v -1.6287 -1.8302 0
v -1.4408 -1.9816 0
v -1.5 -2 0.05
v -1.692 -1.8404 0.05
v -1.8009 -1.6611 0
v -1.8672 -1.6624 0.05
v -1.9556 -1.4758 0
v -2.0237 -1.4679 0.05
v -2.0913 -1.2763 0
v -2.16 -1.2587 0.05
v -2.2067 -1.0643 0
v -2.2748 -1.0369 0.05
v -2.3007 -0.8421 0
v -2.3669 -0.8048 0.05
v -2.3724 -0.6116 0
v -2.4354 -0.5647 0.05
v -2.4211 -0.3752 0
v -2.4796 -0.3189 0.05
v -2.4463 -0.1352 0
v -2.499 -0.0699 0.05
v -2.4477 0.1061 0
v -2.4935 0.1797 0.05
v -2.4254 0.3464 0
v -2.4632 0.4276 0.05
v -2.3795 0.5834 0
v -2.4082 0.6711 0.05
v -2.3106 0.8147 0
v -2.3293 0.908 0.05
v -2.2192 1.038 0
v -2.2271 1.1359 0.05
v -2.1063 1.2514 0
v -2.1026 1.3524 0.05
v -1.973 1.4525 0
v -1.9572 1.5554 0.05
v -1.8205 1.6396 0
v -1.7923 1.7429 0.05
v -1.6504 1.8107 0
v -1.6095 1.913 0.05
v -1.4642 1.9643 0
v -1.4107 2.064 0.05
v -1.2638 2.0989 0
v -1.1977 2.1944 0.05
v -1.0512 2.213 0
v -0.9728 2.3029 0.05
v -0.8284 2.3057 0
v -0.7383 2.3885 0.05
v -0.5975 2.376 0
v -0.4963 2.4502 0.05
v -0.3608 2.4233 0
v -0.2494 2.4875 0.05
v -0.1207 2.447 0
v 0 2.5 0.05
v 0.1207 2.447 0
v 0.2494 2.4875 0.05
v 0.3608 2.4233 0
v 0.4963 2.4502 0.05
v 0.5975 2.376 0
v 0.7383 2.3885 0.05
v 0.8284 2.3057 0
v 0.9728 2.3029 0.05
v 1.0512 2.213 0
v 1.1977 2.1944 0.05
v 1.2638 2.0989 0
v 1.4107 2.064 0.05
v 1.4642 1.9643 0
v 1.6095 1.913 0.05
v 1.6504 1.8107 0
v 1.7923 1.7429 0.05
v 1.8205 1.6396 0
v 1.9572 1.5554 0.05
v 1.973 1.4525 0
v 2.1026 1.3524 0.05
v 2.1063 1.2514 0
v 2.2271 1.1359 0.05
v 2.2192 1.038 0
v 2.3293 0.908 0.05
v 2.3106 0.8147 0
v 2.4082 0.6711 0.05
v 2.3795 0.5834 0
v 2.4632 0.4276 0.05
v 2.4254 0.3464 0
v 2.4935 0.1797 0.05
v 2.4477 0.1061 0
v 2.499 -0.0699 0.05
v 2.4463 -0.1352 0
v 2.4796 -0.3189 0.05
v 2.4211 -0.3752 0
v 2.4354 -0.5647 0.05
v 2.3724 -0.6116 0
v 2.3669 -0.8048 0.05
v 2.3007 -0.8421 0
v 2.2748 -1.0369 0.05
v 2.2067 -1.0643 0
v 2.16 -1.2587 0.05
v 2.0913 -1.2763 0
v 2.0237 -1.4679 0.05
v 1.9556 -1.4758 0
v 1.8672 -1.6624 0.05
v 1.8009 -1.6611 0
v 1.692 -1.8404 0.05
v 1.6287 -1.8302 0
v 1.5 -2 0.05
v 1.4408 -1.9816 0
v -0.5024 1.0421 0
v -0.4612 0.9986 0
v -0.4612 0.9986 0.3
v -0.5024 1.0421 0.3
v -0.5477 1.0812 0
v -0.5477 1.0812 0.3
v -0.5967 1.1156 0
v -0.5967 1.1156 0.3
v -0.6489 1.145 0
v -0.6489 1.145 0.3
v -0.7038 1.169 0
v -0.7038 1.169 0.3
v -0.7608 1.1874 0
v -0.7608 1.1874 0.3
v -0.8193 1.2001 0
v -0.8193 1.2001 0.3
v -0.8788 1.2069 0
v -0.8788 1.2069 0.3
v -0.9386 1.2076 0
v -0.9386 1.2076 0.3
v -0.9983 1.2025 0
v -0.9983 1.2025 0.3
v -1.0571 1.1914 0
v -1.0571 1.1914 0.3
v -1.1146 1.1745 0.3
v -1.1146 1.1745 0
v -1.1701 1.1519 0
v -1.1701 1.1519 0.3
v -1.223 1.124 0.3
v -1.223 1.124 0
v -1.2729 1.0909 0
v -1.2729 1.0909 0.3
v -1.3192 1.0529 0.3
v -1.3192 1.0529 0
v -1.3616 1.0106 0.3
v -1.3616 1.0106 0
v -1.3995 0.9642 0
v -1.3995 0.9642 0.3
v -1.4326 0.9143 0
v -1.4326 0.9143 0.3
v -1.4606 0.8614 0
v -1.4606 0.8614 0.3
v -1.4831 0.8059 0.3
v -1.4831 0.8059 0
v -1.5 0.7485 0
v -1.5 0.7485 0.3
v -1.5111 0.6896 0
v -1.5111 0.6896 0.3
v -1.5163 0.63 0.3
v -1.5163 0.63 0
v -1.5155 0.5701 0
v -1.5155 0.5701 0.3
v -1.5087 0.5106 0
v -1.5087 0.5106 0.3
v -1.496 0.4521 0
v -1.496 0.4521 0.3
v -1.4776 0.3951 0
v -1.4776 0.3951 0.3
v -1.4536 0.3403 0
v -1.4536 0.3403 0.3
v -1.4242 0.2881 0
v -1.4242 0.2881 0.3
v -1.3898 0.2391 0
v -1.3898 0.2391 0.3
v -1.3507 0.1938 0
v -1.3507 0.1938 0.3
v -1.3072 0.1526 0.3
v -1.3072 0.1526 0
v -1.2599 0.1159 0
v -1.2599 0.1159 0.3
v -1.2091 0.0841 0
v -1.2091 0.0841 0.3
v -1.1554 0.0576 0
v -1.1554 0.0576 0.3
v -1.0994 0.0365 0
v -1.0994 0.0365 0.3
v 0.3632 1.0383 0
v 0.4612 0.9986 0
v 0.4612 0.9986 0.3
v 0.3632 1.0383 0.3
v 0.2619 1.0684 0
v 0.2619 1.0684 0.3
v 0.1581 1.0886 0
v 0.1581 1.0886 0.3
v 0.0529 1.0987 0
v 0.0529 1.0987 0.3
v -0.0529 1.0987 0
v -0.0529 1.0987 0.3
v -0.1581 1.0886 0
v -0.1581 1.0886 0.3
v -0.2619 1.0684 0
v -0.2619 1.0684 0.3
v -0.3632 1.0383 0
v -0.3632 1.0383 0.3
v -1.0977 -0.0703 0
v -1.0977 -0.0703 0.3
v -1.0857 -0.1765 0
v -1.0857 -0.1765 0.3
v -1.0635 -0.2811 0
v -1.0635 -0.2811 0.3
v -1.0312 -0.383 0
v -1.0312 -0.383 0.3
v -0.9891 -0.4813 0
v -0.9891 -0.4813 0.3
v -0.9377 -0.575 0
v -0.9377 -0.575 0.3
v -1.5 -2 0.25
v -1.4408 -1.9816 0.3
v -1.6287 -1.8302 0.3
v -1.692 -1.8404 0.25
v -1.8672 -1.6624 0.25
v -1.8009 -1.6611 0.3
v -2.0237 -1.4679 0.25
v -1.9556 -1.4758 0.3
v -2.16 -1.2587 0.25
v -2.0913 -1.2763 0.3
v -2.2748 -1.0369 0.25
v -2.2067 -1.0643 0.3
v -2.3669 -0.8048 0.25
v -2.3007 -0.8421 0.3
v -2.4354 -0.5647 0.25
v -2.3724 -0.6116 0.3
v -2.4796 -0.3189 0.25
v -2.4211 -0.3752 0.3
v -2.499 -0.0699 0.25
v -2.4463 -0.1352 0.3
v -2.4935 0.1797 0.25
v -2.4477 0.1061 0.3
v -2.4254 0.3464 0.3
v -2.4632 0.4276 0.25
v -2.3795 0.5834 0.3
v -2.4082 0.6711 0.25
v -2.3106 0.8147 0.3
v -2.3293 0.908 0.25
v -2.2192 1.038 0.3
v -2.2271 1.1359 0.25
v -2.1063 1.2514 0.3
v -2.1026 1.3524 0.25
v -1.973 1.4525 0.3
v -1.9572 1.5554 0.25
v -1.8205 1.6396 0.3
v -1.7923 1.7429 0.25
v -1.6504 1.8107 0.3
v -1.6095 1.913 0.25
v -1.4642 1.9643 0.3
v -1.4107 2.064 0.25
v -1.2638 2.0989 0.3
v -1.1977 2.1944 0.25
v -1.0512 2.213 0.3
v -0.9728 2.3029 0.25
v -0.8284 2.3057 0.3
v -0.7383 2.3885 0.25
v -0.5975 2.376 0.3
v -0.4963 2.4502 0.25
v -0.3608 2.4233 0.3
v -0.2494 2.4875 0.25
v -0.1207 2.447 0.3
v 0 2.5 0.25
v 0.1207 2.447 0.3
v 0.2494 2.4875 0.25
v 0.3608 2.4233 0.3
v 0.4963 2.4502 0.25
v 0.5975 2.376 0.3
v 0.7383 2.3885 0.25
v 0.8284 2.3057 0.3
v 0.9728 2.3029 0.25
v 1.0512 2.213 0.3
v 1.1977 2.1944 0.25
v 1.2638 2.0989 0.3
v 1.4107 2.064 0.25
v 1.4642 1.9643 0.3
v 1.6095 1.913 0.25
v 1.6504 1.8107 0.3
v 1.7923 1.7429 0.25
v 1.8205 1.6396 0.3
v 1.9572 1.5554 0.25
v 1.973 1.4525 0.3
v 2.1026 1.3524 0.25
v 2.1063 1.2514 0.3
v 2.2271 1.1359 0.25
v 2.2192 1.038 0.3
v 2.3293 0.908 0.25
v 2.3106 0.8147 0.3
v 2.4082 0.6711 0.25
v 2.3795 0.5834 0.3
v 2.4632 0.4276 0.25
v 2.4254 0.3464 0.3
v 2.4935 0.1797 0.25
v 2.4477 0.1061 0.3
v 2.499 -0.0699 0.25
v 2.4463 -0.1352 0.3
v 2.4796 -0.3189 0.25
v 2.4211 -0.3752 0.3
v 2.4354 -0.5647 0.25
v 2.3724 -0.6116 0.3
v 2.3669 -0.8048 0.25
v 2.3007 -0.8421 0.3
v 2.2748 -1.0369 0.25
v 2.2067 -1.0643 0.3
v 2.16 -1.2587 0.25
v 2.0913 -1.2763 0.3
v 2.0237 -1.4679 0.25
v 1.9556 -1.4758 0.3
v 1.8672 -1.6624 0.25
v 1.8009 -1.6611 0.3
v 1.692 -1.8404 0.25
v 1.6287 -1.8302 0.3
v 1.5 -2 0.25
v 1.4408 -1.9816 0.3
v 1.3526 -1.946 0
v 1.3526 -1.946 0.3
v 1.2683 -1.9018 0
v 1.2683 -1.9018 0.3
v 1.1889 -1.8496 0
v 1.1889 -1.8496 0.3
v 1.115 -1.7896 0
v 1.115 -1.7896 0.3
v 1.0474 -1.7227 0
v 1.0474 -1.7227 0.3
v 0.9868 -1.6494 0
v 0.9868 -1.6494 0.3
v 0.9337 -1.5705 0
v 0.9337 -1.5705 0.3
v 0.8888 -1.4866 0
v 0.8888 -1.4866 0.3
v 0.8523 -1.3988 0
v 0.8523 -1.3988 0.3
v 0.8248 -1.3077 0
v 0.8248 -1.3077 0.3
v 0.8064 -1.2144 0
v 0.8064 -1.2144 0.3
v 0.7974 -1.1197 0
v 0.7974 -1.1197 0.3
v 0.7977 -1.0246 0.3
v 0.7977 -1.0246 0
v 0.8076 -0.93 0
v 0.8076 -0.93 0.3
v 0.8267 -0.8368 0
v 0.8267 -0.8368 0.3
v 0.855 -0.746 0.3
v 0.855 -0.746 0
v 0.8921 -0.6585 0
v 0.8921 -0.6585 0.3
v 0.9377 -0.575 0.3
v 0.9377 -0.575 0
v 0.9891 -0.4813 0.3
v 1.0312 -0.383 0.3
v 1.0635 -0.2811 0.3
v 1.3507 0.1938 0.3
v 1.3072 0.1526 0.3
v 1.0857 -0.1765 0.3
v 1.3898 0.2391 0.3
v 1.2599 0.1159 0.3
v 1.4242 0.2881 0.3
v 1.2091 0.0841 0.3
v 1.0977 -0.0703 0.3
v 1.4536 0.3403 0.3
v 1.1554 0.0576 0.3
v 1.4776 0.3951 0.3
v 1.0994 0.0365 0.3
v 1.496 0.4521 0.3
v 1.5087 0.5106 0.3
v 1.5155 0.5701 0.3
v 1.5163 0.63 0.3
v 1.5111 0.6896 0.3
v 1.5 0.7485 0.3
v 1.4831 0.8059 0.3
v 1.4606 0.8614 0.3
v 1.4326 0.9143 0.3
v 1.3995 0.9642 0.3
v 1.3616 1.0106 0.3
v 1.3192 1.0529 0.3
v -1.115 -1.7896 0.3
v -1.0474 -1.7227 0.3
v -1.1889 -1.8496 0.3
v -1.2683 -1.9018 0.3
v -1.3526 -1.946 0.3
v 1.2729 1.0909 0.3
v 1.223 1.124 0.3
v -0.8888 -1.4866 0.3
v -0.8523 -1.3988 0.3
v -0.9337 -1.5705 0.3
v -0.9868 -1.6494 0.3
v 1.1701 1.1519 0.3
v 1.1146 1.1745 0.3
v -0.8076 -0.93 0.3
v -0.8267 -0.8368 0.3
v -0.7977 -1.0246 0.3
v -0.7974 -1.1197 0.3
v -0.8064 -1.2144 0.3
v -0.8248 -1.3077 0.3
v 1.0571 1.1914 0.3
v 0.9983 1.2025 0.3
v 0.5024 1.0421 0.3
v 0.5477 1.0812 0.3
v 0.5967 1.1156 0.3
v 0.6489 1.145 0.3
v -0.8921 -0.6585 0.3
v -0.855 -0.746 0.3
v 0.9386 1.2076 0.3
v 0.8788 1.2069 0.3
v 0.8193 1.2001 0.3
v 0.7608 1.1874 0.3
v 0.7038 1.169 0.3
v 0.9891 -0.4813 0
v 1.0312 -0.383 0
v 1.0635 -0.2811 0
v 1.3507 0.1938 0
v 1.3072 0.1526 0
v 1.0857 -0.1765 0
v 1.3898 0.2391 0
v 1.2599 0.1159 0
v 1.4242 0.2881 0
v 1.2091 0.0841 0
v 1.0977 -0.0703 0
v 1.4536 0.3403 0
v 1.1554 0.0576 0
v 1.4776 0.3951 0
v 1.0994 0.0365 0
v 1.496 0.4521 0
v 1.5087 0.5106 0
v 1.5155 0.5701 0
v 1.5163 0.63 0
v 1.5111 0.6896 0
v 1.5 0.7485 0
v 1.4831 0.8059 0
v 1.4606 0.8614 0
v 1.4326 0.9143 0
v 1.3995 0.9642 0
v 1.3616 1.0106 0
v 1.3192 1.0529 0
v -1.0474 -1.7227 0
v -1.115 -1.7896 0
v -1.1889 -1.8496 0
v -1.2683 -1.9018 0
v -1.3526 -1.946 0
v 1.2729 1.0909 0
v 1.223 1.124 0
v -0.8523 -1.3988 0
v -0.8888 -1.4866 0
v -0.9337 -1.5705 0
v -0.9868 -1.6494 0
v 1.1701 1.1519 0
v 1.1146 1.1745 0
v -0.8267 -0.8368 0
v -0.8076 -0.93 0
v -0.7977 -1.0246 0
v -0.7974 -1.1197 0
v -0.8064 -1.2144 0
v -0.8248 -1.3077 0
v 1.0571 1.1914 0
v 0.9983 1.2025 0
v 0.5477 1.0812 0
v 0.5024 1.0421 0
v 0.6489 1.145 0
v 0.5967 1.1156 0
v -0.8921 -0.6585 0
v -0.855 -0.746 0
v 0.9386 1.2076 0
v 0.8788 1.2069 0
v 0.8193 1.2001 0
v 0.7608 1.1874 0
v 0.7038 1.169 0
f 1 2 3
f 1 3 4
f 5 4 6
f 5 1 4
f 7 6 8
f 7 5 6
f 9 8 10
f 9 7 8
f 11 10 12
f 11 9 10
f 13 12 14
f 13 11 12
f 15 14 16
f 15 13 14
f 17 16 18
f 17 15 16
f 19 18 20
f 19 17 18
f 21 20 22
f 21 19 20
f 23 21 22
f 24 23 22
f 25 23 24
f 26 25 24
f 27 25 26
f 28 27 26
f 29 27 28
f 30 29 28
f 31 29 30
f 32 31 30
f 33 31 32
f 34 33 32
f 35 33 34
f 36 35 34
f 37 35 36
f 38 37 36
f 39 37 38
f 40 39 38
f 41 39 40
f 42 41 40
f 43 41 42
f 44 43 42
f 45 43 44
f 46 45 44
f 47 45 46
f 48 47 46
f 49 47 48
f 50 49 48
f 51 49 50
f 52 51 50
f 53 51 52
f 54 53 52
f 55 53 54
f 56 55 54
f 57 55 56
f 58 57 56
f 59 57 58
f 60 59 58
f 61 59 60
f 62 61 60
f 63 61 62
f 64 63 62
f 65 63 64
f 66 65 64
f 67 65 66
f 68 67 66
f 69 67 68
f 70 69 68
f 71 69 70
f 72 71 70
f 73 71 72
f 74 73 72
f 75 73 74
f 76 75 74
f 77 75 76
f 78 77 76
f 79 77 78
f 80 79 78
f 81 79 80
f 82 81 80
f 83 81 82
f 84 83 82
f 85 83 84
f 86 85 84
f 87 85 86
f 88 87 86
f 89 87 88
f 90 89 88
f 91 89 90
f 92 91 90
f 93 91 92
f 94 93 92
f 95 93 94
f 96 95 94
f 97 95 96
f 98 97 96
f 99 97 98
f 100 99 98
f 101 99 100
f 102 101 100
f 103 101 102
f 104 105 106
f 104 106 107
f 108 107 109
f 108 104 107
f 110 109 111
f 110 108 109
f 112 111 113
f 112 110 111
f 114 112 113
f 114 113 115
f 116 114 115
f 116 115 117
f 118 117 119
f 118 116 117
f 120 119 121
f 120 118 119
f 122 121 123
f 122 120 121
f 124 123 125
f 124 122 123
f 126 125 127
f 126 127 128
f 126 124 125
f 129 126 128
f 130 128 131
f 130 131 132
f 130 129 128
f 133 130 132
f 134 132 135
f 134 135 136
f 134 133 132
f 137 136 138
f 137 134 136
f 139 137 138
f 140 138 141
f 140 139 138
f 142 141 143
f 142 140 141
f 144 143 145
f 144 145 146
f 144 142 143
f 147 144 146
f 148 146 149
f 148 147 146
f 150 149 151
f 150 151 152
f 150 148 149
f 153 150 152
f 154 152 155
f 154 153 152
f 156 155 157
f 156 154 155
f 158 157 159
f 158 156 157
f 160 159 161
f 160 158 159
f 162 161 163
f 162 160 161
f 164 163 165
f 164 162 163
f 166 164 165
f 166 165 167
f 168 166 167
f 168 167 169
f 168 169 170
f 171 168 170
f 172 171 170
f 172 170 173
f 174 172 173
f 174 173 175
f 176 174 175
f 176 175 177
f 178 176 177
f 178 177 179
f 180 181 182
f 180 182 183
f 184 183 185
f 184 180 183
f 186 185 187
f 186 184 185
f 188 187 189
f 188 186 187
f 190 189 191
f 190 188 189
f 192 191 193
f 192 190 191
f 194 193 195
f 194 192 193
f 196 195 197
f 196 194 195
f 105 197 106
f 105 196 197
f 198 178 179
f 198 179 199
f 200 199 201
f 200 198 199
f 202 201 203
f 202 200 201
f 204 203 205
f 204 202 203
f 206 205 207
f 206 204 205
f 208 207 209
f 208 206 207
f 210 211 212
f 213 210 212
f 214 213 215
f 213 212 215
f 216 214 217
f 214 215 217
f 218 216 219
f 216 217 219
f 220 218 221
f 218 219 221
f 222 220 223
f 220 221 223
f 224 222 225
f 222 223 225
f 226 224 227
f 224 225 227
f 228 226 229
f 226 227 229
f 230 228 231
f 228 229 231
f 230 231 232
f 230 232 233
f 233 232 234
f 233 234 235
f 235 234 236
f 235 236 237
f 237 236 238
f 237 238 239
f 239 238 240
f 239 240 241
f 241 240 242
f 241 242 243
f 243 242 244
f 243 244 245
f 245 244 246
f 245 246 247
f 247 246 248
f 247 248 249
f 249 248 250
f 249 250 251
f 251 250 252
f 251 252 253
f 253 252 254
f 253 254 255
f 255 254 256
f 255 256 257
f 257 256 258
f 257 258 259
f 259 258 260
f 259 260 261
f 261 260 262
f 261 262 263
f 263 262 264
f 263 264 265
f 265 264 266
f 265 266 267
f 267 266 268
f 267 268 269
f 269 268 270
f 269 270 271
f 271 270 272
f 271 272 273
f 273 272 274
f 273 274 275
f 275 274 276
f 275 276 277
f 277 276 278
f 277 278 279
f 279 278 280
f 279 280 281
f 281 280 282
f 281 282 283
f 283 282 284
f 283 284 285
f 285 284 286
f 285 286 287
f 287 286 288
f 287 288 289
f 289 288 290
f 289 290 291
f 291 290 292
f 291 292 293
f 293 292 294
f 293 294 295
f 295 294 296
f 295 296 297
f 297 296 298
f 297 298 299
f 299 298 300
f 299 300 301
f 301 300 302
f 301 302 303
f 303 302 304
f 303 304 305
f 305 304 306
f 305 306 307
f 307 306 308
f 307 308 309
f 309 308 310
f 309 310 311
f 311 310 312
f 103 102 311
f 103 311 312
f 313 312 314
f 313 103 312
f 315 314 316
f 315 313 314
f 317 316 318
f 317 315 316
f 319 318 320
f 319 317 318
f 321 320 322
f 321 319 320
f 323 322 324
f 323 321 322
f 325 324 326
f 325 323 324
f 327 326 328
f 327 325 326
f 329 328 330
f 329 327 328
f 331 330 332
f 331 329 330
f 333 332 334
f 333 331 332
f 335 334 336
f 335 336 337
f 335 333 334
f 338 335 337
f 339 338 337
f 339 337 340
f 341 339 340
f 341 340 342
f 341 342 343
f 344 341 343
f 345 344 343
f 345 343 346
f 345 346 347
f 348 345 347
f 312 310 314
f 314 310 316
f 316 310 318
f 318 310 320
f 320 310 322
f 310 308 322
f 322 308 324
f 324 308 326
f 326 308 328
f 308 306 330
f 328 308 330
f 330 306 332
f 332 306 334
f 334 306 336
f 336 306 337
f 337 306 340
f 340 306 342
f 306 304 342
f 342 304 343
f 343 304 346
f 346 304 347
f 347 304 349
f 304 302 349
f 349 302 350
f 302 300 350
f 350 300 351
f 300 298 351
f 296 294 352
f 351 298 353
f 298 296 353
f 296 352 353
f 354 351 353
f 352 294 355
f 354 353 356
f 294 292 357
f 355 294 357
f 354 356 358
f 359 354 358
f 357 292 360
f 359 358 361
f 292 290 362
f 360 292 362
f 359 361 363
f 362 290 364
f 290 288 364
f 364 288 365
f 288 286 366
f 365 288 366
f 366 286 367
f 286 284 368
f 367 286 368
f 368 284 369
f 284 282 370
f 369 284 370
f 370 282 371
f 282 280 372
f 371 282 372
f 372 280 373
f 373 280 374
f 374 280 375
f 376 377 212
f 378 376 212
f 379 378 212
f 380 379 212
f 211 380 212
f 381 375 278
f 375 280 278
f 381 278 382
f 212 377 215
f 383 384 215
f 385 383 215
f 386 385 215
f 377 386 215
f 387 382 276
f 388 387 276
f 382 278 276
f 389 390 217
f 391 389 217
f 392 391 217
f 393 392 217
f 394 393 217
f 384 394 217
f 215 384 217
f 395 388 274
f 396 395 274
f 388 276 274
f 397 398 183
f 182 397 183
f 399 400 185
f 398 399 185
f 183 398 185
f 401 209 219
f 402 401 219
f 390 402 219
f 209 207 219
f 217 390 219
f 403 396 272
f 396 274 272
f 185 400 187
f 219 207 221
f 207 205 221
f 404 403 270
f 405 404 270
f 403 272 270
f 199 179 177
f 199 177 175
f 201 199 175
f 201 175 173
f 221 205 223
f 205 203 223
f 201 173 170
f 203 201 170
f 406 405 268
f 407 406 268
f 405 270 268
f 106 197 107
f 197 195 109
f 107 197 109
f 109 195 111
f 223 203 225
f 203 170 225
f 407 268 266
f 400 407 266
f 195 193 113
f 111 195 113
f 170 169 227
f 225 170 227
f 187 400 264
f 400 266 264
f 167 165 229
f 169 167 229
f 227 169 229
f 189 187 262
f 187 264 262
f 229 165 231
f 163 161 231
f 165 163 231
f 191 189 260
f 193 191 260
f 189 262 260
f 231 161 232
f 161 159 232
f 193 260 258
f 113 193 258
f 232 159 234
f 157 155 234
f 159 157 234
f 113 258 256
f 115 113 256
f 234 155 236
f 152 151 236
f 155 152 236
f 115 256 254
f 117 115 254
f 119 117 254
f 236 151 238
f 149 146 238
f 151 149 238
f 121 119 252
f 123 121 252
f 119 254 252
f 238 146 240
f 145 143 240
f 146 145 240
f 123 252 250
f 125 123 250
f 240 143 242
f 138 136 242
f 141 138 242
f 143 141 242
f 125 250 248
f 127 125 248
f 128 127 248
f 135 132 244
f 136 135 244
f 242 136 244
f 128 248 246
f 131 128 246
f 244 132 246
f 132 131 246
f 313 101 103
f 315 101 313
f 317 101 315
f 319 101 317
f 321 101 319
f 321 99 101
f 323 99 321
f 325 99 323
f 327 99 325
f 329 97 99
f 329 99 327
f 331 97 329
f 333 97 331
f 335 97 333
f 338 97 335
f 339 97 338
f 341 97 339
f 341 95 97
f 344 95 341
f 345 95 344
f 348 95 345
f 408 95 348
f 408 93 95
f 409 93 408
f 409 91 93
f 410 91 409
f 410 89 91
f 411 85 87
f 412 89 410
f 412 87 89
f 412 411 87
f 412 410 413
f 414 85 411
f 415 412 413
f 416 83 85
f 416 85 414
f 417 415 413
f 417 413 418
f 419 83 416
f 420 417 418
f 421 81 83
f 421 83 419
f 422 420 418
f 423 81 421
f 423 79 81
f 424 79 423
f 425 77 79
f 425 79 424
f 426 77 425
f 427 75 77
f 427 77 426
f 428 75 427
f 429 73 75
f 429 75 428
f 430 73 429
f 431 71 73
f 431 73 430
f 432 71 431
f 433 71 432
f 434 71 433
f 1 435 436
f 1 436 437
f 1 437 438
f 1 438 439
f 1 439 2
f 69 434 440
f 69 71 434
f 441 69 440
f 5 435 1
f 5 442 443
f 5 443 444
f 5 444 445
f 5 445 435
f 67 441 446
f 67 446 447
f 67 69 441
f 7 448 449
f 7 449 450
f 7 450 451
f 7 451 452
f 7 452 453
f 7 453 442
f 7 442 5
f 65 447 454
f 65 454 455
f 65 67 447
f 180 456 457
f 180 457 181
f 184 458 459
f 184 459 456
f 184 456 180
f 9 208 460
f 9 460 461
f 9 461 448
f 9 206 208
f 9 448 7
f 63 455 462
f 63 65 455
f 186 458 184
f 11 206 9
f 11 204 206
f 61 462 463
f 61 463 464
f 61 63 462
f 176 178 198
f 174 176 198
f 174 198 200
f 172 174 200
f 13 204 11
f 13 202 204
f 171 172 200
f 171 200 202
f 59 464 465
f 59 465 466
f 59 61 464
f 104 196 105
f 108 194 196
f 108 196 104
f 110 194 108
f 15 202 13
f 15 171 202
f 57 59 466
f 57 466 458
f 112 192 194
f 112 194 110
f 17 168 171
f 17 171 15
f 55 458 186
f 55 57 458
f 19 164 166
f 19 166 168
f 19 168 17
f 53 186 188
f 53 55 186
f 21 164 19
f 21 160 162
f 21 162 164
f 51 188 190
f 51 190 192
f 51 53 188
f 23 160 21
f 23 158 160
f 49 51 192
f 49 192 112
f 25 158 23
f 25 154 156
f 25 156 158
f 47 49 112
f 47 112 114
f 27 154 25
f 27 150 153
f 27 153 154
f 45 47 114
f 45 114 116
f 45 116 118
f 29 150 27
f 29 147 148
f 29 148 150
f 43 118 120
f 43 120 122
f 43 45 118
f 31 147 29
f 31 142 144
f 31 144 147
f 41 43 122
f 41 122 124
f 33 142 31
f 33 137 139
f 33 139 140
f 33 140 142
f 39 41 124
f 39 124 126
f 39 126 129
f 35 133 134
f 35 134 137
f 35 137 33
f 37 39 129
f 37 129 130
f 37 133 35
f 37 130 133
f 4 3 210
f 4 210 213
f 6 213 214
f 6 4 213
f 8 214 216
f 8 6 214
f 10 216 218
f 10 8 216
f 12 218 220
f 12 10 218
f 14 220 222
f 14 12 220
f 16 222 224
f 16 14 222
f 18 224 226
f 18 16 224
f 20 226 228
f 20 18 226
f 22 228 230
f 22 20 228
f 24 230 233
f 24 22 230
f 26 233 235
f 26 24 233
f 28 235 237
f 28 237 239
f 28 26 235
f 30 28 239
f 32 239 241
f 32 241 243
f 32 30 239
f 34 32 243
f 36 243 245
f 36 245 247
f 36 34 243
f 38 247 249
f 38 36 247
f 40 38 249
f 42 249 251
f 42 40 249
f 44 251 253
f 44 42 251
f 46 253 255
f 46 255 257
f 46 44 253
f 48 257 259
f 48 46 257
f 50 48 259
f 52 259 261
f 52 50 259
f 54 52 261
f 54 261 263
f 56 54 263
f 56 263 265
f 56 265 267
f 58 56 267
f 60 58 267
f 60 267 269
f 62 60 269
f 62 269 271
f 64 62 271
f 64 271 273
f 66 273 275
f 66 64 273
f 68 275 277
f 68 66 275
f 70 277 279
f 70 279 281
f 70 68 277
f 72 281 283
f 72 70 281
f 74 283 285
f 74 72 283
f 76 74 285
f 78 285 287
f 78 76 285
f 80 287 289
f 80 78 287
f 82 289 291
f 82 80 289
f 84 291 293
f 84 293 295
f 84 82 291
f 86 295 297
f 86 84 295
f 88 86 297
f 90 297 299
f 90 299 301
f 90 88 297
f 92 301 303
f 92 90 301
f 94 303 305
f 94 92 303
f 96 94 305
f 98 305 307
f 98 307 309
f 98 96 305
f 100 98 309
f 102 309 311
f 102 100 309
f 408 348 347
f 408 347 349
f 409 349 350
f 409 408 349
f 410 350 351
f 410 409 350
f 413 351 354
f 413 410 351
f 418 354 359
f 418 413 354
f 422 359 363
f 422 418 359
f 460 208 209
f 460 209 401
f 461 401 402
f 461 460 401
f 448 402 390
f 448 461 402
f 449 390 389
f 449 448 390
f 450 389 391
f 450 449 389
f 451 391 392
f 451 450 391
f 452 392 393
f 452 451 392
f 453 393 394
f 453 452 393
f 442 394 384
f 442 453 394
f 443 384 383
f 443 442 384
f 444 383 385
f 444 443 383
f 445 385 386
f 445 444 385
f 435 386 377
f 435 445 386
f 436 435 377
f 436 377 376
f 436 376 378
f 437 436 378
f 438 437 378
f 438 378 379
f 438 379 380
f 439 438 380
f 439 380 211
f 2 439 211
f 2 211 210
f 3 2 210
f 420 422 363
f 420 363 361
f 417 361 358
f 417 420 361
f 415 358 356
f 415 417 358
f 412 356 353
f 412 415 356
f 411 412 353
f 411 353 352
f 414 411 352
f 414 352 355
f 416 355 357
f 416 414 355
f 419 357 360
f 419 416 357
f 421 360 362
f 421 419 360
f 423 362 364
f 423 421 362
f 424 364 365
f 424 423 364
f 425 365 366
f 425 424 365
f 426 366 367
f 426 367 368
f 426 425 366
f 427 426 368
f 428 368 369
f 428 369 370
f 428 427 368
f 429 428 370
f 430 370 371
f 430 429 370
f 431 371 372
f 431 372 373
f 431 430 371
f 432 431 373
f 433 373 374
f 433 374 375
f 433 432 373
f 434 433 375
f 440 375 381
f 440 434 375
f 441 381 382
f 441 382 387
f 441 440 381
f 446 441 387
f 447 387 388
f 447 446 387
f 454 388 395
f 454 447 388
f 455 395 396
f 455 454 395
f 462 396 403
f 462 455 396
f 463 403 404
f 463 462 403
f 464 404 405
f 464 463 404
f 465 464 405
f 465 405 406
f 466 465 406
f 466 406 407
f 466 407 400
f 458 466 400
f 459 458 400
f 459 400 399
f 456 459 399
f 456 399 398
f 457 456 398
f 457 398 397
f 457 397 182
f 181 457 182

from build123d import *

# Parameters (mm, degrees)
EXTRUDE_1_DEPTH = 0.3
CHAMFER_1_SIZE  = 0.05


with BuildPart() as part:
    # 草图1 → 凸台-拉伸1 (new body)
    with BuildSketch(Plane.XY):
        with BuildLine():
            ThreePointArc((-1.099392644, 0.036548782), (-1.063477372, -0.281097632), (-0.937747349, -0.57500427))
            ThreePointArc((-0.937747349, -0.57500427), (-0.863262156, -1.427813797), (-1.5, -2))
            ThreePointArc((-1.5, -2), (0, 2.5), (1.5, -2))
            ThreePointArc((1.5, -2), (0.863262156, -1.427813797), (0.937747349, -0.57500427))
            ThreePointArc((0.937747349, -0.57500427), (1.063477372, -0.281097632), (1.099392644, 0.036548782))
            ThreePointArc((1.099392644, 0.036548782), (1.416666667, 0.939710357), (0.461213416, 0.998640168))
            ThreePointArc((0.461213416, 0.998640168), (0, 1.1), (-0.461213416, 0.998640168))
            ThreePointArc((-0.461213416, 0.998640168), (-1.416666667, 0.939710357), (-1.099392644, 0.036548782))
        make_face()
    extrude(amount=EXTRUDE_1_DEPTH)

    # 倒角1
    chamfer_1_edges = [part.edges().sort_by_distance(p)[0] for p in [
        (0, 2.5, 0.3),
        (0, 2.5, 0),
    ]]
    chamfer(chamfer_1_edges, length=CHAMFER_1_SIZE)


solid = part.part
